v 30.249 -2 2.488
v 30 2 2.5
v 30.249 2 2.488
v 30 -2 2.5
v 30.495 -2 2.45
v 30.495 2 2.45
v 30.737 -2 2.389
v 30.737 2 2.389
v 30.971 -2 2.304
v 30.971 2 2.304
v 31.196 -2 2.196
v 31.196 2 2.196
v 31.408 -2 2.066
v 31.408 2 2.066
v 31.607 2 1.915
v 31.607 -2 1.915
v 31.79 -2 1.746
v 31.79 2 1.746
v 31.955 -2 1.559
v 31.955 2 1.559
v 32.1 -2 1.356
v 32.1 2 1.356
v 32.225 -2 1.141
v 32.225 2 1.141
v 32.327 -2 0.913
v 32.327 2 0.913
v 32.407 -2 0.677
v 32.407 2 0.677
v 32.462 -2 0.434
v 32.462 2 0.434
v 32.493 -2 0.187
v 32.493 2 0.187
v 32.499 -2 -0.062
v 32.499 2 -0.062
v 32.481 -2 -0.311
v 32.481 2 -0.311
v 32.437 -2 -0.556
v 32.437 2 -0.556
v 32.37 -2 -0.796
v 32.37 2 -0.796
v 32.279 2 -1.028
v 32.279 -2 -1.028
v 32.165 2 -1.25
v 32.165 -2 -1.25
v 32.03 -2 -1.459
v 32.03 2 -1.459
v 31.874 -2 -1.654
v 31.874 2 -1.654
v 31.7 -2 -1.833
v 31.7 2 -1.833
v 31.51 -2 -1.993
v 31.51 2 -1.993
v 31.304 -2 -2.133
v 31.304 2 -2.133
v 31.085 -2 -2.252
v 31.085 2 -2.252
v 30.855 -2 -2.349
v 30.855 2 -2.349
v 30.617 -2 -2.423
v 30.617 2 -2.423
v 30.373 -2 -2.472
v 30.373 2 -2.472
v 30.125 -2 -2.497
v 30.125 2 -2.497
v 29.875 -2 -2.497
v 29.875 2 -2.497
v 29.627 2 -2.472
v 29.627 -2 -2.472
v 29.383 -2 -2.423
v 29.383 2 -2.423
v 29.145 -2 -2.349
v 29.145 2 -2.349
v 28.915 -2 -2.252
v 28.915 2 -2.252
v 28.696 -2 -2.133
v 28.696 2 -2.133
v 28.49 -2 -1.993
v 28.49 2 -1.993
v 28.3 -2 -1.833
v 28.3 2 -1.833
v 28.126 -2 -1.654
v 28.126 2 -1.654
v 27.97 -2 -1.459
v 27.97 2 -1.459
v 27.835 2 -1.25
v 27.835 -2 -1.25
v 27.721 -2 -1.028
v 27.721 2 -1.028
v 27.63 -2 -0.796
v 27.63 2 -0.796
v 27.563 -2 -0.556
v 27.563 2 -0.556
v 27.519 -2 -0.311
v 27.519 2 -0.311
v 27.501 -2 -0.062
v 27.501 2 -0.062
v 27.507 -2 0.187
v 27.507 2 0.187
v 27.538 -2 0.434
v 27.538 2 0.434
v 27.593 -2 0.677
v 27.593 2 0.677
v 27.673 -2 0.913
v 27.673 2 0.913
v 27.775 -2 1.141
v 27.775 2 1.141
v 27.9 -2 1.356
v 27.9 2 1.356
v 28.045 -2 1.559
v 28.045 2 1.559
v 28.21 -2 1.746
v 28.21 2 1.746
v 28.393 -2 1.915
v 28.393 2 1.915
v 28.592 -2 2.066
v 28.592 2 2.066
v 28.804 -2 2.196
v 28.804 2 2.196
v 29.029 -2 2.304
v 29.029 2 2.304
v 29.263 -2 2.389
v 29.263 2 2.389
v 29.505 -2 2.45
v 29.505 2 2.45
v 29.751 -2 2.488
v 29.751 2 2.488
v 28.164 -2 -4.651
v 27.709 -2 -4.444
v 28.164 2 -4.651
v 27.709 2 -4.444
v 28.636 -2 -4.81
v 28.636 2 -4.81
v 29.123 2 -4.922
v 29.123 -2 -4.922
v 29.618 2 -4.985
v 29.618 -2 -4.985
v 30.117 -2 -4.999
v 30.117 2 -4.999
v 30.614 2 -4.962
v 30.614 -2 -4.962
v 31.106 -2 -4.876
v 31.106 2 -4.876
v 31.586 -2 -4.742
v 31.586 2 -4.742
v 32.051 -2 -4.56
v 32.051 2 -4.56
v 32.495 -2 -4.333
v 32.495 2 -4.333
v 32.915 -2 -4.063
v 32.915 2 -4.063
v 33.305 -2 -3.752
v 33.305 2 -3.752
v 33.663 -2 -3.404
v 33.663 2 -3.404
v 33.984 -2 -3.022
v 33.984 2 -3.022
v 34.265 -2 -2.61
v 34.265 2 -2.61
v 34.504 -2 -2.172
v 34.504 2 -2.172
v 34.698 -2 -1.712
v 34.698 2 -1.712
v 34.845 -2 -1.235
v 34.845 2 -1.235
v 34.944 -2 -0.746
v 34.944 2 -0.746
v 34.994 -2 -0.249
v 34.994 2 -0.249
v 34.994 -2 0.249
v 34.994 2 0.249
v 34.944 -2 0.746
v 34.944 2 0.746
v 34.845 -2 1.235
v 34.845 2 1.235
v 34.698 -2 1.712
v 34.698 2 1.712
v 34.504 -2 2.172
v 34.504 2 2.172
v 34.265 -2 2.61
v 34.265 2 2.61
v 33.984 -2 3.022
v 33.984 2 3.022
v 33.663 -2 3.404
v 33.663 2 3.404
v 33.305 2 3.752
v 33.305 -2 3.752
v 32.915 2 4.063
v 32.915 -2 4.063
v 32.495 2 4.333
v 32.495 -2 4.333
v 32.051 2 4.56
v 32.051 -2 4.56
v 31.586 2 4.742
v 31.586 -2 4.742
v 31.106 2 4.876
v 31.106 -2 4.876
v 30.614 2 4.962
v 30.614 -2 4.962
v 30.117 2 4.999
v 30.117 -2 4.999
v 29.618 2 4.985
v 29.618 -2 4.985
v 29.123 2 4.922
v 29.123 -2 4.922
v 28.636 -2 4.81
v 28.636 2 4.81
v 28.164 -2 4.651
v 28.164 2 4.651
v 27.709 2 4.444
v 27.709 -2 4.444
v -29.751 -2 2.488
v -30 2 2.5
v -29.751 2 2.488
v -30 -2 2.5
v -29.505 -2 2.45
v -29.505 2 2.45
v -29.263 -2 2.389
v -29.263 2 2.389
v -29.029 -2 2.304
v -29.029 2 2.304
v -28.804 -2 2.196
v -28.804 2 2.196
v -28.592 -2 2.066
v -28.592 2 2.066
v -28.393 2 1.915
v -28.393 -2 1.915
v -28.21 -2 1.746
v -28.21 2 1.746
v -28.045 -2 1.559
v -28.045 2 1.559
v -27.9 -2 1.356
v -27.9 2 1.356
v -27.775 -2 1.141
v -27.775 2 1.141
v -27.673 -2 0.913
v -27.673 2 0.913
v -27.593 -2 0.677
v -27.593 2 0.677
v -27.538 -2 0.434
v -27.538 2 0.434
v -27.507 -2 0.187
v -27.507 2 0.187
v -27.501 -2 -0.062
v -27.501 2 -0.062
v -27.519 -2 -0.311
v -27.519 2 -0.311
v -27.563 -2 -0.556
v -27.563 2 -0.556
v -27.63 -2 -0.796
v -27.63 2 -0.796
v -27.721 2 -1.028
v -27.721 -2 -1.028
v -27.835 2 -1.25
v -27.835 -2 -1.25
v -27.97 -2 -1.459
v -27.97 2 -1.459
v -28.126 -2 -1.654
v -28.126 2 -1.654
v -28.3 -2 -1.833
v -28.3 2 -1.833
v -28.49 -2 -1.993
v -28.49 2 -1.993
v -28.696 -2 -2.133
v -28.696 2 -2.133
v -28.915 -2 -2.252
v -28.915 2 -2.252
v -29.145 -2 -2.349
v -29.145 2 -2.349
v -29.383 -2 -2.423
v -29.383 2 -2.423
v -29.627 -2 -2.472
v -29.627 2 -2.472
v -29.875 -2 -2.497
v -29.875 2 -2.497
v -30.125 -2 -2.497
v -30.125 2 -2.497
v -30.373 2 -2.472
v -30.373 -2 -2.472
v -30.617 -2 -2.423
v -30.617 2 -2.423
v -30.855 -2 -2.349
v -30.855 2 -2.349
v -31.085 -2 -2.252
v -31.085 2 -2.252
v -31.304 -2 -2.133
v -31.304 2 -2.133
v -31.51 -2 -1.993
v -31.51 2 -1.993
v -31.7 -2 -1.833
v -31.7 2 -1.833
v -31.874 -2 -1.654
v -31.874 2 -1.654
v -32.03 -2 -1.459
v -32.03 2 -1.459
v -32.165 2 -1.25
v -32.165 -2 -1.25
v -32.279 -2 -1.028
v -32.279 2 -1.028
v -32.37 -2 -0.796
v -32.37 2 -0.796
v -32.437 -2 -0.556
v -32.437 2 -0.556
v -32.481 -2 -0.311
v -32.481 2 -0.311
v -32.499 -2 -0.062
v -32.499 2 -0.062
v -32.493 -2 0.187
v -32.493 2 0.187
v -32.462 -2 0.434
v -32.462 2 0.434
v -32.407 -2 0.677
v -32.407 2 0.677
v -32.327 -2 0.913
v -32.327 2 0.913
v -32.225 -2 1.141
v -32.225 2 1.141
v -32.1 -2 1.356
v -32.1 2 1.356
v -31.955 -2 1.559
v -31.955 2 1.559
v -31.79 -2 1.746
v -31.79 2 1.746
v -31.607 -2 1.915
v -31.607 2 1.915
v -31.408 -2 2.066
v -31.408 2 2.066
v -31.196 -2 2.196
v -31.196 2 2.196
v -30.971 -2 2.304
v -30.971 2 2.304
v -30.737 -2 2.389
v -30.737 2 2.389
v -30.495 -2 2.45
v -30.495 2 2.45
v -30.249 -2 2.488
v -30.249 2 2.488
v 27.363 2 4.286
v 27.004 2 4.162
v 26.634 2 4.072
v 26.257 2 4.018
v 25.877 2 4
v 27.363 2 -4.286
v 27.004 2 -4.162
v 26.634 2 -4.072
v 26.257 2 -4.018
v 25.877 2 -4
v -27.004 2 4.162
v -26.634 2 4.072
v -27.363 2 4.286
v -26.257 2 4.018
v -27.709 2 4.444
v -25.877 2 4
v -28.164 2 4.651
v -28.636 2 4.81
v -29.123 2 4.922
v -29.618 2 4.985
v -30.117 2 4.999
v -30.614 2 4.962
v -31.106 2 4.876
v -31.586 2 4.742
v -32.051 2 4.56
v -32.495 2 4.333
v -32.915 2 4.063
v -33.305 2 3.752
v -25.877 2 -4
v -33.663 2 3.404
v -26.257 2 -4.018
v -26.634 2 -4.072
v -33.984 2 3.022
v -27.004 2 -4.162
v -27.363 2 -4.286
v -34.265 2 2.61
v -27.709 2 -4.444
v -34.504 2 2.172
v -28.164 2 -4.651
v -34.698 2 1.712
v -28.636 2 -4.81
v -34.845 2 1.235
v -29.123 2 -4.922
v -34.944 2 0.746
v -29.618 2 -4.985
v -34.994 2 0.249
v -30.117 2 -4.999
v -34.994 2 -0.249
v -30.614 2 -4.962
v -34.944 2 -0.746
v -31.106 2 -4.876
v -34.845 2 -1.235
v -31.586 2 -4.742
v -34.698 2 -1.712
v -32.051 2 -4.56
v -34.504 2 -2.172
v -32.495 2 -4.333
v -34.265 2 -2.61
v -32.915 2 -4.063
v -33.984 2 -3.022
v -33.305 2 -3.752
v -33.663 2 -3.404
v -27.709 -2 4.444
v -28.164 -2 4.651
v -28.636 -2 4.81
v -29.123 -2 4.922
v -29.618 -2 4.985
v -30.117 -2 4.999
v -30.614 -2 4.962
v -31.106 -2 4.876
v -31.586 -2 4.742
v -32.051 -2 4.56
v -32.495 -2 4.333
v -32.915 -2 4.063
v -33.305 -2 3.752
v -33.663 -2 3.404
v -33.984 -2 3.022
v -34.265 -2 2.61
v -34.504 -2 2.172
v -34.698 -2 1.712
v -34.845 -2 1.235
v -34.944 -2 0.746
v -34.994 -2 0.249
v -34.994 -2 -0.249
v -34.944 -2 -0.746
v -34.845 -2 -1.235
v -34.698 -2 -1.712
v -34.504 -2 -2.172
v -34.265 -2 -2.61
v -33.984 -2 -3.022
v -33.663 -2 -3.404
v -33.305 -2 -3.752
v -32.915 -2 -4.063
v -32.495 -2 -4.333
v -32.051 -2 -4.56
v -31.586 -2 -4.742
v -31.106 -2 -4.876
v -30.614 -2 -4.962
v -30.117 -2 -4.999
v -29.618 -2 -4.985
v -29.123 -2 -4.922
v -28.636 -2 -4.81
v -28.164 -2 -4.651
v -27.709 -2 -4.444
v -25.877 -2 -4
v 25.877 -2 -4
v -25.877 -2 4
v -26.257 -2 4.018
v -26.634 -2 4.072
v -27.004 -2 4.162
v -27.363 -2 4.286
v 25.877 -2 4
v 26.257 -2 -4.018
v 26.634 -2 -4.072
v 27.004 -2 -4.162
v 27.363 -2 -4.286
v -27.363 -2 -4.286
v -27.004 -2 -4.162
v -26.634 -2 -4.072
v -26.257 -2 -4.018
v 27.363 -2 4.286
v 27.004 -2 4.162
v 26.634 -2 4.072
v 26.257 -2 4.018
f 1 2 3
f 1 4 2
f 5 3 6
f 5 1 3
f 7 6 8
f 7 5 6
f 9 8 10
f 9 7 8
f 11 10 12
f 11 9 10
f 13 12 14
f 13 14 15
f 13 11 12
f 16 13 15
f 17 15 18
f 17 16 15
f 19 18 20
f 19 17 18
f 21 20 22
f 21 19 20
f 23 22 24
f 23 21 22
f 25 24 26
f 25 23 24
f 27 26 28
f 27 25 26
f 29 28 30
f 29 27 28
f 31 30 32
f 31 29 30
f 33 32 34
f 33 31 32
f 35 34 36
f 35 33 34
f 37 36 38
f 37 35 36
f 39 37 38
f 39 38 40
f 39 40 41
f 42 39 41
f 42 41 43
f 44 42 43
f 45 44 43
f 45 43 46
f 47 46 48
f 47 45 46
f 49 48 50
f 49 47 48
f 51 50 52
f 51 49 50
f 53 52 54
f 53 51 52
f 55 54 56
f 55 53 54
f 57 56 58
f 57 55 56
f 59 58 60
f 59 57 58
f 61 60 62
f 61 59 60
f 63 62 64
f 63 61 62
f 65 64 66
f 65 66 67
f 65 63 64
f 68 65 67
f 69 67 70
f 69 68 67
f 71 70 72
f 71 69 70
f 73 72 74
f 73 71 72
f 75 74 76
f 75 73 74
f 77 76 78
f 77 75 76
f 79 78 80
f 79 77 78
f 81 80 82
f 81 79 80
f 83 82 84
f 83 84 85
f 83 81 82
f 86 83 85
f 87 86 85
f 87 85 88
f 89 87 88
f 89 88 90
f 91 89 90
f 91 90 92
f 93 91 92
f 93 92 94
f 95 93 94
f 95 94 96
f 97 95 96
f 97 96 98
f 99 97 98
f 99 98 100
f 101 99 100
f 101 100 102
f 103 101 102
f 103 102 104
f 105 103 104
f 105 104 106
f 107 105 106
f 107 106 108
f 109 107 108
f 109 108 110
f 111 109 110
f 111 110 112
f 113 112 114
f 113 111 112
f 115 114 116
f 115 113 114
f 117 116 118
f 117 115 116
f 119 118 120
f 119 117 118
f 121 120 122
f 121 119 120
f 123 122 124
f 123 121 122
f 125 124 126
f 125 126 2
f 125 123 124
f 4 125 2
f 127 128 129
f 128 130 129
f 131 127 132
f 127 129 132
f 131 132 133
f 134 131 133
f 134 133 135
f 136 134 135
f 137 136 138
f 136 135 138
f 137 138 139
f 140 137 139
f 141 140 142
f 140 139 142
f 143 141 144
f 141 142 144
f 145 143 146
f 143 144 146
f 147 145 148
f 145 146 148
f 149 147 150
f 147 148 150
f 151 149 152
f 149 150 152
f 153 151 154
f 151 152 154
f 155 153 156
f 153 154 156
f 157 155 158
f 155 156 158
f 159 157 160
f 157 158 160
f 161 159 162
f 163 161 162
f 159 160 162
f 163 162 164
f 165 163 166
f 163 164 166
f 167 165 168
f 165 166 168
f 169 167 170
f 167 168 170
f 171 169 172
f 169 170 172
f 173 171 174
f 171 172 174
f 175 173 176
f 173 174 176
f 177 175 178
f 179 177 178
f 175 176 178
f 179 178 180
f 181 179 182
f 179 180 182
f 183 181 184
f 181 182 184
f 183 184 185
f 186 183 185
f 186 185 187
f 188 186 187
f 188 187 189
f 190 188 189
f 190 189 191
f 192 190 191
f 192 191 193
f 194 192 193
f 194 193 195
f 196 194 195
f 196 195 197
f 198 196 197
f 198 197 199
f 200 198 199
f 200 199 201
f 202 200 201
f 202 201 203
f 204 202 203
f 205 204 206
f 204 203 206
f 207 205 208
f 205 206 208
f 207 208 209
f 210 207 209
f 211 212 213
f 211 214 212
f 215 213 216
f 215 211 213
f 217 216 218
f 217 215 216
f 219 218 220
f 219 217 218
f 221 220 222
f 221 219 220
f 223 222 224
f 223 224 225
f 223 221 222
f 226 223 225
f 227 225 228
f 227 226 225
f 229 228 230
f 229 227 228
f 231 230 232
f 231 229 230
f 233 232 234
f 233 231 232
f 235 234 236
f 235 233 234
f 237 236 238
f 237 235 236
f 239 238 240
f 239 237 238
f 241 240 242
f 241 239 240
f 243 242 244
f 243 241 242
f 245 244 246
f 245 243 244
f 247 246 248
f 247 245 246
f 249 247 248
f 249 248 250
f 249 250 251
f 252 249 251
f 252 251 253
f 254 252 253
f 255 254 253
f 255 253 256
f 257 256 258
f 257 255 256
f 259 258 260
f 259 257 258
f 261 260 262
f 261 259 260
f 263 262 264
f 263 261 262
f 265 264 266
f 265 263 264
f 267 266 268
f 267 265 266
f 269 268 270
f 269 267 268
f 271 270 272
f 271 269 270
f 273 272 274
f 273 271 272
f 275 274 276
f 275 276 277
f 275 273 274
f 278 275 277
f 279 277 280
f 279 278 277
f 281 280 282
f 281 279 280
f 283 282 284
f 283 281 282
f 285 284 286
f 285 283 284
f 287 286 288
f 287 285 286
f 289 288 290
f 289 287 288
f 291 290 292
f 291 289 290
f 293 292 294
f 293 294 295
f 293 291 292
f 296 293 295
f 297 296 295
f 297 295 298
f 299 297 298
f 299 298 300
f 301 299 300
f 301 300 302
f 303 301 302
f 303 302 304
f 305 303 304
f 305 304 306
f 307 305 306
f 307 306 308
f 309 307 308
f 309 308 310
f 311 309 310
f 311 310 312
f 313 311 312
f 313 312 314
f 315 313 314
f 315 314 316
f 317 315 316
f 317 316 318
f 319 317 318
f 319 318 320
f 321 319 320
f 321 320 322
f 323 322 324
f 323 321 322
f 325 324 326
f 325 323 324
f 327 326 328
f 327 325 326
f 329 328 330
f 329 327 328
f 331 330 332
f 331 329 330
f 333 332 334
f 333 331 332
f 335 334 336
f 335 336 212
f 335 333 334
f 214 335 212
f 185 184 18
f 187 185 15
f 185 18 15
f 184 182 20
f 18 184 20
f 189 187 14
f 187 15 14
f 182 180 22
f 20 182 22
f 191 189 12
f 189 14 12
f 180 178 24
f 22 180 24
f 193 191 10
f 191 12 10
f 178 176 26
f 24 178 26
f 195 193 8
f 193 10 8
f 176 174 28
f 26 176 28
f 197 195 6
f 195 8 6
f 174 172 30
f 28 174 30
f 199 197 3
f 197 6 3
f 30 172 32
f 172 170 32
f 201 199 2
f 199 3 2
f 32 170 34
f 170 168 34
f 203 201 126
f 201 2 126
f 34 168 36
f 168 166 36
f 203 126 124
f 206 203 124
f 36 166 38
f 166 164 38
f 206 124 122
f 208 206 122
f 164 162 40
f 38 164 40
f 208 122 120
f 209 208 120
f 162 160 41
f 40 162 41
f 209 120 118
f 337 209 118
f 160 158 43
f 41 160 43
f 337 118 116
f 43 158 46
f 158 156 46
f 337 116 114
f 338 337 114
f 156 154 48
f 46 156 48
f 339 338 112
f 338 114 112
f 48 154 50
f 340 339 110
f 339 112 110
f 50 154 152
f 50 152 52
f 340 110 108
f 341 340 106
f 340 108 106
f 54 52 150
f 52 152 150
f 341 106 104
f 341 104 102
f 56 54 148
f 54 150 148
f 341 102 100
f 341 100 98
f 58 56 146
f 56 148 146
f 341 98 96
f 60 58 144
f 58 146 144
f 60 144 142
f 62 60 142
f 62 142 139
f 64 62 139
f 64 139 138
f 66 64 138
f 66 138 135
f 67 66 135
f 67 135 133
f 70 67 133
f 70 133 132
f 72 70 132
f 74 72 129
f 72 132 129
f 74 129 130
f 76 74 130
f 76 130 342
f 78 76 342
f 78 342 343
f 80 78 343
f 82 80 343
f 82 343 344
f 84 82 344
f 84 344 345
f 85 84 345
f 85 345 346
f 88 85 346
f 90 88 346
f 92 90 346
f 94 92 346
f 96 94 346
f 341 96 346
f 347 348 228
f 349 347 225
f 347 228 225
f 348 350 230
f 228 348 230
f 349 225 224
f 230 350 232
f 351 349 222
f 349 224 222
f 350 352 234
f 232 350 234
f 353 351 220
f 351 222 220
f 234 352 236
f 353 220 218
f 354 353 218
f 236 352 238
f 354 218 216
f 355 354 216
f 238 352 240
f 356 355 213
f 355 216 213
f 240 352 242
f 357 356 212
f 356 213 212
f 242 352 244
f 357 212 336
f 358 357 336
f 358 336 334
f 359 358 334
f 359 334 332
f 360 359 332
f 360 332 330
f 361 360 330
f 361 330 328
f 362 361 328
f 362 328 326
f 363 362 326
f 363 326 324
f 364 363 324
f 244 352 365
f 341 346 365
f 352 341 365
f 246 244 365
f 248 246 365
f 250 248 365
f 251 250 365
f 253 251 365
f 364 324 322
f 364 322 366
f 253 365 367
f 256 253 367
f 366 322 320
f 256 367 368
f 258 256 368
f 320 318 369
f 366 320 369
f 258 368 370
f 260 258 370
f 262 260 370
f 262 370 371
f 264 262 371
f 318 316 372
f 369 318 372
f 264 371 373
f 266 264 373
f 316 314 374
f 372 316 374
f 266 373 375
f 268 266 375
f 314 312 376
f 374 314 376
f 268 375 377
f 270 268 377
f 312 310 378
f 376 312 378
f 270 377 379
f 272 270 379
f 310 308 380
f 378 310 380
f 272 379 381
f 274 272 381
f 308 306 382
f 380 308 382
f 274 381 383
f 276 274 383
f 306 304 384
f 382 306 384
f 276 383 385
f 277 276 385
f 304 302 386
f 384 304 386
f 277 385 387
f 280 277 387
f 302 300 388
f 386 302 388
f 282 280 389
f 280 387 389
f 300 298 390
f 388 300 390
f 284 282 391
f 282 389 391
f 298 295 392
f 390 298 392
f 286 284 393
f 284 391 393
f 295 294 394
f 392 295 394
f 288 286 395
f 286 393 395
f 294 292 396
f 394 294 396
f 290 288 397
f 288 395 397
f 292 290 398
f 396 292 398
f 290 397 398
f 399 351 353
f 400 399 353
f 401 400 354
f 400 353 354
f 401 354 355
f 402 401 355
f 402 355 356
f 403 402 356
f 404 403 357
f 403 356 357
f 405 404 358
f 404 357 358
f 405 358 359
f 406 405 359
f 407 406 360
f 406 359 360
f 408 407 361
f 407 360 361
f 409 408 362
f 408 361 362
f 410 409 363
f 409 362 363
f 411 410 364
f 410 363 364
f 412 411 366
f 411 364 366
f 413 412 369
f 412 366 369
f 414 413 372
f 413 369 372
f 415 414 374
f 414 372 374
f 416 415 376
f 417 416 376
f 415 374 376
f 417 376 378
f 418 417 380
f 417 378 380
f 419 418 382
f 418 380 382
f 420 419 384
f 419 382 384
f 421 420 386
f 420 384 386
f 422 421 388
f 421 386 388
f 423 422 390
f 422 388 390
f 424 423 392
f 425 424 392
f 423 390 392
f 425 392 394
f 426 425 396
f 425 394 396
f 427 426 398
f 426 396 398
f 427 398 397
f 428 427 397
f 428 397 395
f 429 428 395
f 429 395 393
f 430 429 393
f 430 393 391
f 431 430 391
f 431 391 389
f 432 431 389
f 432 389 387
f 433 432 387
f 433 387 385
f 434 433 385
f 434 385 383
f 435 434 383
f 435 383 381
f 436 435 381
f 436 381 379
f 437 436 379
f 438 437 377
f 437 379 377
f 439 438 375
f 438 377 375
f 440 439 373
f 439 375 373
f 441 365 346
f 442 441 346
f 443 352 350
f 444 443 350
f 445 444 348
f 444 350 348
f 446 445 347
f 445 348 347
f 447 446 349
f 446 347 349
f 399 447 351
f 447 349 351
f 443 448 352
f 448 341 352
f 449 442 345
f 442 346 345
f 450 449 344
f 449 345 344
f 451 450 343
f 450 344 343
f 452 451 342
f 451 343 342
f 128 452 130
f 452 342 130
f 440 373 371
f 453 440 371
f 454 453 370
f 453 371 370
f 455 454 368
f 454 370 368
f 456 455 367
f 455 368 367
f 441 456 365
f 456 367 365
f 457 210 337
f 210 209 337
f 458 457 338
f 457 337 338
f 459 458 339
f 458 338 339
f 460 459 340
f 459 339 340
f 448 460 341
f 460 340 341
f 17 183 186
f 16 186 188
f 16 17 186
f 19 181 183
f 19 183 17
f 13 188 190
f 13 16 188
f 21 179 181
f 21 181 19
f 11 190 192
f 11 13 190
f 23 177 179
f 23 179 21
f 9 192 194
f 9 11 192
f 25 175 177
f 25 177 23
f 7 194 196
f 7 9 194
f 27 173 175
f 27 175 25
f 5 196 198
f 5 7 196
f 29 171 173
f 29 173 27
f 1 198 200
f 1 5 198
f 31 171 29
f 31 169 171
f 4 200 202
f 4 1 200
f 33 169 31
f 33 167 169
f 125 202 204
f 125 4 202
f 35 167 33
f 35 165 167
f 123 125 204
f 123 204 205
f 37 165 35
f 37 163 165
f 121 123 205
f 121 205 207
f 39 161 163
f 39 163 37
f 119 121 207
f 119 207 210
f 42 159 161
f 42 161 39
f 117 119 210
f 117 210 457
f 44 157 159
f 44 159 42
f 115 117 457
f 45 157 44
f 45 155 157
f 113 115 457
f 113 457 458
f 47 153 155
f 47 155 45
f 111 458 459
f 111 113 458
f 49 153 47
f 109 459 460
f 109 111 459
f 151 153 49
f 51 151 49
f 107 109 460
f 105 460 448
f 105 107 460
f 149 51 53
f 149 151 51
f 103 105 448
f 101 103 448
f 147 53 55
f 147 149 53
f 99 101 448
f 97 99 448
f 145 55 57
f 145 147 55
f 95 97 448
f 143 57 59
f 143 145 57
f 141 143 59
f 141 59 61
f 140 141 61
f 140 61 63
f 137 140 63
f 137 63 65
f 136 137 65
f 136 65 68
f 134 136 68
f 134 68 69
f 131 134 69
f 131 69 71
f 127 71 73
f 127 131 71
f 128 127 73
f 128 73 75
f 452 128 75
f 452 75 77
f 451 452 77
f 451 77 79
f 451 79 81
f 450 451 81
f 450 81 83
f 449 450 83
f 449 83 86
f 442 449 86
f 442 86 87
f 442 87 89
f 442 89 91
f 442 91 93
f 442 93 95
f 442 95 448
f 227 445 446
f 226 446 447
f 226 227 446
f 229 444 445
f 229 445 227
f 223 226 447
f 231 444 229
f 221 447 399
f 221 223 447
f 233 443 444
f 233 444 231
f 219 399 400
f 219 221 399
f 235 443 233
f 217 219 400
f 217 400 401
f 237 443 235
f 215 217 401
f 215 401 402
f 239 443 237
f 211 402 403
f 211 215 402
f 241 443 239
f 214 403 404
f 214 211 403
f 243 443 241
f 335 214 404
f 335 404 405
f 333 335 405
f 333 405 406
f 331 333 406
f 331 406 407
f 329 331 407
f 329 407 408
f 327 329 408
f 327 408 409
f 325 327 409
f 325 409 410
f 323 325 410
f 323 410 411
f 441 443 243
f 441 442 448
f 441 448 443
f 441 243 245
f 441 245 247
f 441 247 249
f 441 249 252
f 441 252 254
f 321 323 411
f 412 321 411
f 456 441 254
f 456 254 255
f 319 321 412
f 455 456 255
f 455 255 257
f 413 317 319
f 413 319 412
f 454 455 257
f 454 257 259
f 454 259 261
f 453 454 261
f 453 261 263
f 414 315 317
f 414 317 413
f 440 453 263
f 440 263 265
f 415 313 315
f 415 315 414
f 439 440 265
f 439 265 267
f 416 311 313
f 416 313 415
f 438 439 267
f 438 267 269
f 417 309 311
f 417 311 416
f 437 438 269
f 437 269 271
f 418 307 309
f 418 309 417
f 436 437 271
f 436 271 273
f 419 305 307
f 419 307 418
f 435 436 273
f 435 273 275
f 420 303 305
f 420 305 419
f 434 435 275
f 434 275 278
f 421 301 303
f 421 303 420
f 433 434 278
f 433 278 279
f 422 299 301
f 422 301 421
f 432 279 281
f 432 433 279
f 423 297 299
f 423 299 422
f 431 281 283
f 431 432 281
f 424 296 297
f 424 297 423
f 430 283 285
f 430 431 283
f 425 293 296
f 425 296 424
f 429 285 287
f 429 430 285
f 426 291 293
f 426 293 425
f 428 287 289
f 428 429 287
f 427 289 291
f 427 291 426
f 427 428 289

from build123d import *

# Parameters (mm, degrees)
SKETCH1_R           = 2.5
BOSS_EXTRUDE1_DEPTH = 2


with BuildPart() as part:
    # Sketch1 → Boss-Extrude1 (new, symmetric)
    with BuildSketch(Plane(origin=(0, 0, 0), x_dir=(1, 0, 0), z_dir=(0, 1, 0))):
        with BuildLine():
            Line((-25.876894374, 4), (25.876894374, 4))
            ThreePointArc((25.876894374, 4), (26.819703416, 4.112698737), (27.709385764, 4.444444444))
            ThreePointArc((27.709385764, 4.444444444), (35, 0), (27.709385764, -4.444444444))
            ThreePointArc((27.709385764, -4.444444444), (26.819703416, -4.112698737), (25.876894374, -4))
            Line((25.876894374, -4), (-25.876894374, -4))
            ThreePointArc((-25.876894374, -4), (-26.819703416, -4.112698737), (-27.709385764, -4.444444444))
            ThreePointArc((-27.709385764, -4.444444444), (-35, 0), (-27.709385764, 4.444444444))
            ThreePointArc((-27.709385764, 4.444444444), (-26.819703416, 4.112698737), (-25.876894374, 4))
        make_face()
        with Locations(Location((-30, 0, 0), (0, 0, 270))):
            Circle(SKETCH1_R, mode=Mode.SUBTRACT)
        with Locations(Location((30, 0, 0), (0, 0, 270))):
            Circle(SKETCH1_R, mode=Mode.SUBTRACT)
    extrude(amount=BOSS_EXTRUDE1_DEPTH, both=True)


solid = part.part
